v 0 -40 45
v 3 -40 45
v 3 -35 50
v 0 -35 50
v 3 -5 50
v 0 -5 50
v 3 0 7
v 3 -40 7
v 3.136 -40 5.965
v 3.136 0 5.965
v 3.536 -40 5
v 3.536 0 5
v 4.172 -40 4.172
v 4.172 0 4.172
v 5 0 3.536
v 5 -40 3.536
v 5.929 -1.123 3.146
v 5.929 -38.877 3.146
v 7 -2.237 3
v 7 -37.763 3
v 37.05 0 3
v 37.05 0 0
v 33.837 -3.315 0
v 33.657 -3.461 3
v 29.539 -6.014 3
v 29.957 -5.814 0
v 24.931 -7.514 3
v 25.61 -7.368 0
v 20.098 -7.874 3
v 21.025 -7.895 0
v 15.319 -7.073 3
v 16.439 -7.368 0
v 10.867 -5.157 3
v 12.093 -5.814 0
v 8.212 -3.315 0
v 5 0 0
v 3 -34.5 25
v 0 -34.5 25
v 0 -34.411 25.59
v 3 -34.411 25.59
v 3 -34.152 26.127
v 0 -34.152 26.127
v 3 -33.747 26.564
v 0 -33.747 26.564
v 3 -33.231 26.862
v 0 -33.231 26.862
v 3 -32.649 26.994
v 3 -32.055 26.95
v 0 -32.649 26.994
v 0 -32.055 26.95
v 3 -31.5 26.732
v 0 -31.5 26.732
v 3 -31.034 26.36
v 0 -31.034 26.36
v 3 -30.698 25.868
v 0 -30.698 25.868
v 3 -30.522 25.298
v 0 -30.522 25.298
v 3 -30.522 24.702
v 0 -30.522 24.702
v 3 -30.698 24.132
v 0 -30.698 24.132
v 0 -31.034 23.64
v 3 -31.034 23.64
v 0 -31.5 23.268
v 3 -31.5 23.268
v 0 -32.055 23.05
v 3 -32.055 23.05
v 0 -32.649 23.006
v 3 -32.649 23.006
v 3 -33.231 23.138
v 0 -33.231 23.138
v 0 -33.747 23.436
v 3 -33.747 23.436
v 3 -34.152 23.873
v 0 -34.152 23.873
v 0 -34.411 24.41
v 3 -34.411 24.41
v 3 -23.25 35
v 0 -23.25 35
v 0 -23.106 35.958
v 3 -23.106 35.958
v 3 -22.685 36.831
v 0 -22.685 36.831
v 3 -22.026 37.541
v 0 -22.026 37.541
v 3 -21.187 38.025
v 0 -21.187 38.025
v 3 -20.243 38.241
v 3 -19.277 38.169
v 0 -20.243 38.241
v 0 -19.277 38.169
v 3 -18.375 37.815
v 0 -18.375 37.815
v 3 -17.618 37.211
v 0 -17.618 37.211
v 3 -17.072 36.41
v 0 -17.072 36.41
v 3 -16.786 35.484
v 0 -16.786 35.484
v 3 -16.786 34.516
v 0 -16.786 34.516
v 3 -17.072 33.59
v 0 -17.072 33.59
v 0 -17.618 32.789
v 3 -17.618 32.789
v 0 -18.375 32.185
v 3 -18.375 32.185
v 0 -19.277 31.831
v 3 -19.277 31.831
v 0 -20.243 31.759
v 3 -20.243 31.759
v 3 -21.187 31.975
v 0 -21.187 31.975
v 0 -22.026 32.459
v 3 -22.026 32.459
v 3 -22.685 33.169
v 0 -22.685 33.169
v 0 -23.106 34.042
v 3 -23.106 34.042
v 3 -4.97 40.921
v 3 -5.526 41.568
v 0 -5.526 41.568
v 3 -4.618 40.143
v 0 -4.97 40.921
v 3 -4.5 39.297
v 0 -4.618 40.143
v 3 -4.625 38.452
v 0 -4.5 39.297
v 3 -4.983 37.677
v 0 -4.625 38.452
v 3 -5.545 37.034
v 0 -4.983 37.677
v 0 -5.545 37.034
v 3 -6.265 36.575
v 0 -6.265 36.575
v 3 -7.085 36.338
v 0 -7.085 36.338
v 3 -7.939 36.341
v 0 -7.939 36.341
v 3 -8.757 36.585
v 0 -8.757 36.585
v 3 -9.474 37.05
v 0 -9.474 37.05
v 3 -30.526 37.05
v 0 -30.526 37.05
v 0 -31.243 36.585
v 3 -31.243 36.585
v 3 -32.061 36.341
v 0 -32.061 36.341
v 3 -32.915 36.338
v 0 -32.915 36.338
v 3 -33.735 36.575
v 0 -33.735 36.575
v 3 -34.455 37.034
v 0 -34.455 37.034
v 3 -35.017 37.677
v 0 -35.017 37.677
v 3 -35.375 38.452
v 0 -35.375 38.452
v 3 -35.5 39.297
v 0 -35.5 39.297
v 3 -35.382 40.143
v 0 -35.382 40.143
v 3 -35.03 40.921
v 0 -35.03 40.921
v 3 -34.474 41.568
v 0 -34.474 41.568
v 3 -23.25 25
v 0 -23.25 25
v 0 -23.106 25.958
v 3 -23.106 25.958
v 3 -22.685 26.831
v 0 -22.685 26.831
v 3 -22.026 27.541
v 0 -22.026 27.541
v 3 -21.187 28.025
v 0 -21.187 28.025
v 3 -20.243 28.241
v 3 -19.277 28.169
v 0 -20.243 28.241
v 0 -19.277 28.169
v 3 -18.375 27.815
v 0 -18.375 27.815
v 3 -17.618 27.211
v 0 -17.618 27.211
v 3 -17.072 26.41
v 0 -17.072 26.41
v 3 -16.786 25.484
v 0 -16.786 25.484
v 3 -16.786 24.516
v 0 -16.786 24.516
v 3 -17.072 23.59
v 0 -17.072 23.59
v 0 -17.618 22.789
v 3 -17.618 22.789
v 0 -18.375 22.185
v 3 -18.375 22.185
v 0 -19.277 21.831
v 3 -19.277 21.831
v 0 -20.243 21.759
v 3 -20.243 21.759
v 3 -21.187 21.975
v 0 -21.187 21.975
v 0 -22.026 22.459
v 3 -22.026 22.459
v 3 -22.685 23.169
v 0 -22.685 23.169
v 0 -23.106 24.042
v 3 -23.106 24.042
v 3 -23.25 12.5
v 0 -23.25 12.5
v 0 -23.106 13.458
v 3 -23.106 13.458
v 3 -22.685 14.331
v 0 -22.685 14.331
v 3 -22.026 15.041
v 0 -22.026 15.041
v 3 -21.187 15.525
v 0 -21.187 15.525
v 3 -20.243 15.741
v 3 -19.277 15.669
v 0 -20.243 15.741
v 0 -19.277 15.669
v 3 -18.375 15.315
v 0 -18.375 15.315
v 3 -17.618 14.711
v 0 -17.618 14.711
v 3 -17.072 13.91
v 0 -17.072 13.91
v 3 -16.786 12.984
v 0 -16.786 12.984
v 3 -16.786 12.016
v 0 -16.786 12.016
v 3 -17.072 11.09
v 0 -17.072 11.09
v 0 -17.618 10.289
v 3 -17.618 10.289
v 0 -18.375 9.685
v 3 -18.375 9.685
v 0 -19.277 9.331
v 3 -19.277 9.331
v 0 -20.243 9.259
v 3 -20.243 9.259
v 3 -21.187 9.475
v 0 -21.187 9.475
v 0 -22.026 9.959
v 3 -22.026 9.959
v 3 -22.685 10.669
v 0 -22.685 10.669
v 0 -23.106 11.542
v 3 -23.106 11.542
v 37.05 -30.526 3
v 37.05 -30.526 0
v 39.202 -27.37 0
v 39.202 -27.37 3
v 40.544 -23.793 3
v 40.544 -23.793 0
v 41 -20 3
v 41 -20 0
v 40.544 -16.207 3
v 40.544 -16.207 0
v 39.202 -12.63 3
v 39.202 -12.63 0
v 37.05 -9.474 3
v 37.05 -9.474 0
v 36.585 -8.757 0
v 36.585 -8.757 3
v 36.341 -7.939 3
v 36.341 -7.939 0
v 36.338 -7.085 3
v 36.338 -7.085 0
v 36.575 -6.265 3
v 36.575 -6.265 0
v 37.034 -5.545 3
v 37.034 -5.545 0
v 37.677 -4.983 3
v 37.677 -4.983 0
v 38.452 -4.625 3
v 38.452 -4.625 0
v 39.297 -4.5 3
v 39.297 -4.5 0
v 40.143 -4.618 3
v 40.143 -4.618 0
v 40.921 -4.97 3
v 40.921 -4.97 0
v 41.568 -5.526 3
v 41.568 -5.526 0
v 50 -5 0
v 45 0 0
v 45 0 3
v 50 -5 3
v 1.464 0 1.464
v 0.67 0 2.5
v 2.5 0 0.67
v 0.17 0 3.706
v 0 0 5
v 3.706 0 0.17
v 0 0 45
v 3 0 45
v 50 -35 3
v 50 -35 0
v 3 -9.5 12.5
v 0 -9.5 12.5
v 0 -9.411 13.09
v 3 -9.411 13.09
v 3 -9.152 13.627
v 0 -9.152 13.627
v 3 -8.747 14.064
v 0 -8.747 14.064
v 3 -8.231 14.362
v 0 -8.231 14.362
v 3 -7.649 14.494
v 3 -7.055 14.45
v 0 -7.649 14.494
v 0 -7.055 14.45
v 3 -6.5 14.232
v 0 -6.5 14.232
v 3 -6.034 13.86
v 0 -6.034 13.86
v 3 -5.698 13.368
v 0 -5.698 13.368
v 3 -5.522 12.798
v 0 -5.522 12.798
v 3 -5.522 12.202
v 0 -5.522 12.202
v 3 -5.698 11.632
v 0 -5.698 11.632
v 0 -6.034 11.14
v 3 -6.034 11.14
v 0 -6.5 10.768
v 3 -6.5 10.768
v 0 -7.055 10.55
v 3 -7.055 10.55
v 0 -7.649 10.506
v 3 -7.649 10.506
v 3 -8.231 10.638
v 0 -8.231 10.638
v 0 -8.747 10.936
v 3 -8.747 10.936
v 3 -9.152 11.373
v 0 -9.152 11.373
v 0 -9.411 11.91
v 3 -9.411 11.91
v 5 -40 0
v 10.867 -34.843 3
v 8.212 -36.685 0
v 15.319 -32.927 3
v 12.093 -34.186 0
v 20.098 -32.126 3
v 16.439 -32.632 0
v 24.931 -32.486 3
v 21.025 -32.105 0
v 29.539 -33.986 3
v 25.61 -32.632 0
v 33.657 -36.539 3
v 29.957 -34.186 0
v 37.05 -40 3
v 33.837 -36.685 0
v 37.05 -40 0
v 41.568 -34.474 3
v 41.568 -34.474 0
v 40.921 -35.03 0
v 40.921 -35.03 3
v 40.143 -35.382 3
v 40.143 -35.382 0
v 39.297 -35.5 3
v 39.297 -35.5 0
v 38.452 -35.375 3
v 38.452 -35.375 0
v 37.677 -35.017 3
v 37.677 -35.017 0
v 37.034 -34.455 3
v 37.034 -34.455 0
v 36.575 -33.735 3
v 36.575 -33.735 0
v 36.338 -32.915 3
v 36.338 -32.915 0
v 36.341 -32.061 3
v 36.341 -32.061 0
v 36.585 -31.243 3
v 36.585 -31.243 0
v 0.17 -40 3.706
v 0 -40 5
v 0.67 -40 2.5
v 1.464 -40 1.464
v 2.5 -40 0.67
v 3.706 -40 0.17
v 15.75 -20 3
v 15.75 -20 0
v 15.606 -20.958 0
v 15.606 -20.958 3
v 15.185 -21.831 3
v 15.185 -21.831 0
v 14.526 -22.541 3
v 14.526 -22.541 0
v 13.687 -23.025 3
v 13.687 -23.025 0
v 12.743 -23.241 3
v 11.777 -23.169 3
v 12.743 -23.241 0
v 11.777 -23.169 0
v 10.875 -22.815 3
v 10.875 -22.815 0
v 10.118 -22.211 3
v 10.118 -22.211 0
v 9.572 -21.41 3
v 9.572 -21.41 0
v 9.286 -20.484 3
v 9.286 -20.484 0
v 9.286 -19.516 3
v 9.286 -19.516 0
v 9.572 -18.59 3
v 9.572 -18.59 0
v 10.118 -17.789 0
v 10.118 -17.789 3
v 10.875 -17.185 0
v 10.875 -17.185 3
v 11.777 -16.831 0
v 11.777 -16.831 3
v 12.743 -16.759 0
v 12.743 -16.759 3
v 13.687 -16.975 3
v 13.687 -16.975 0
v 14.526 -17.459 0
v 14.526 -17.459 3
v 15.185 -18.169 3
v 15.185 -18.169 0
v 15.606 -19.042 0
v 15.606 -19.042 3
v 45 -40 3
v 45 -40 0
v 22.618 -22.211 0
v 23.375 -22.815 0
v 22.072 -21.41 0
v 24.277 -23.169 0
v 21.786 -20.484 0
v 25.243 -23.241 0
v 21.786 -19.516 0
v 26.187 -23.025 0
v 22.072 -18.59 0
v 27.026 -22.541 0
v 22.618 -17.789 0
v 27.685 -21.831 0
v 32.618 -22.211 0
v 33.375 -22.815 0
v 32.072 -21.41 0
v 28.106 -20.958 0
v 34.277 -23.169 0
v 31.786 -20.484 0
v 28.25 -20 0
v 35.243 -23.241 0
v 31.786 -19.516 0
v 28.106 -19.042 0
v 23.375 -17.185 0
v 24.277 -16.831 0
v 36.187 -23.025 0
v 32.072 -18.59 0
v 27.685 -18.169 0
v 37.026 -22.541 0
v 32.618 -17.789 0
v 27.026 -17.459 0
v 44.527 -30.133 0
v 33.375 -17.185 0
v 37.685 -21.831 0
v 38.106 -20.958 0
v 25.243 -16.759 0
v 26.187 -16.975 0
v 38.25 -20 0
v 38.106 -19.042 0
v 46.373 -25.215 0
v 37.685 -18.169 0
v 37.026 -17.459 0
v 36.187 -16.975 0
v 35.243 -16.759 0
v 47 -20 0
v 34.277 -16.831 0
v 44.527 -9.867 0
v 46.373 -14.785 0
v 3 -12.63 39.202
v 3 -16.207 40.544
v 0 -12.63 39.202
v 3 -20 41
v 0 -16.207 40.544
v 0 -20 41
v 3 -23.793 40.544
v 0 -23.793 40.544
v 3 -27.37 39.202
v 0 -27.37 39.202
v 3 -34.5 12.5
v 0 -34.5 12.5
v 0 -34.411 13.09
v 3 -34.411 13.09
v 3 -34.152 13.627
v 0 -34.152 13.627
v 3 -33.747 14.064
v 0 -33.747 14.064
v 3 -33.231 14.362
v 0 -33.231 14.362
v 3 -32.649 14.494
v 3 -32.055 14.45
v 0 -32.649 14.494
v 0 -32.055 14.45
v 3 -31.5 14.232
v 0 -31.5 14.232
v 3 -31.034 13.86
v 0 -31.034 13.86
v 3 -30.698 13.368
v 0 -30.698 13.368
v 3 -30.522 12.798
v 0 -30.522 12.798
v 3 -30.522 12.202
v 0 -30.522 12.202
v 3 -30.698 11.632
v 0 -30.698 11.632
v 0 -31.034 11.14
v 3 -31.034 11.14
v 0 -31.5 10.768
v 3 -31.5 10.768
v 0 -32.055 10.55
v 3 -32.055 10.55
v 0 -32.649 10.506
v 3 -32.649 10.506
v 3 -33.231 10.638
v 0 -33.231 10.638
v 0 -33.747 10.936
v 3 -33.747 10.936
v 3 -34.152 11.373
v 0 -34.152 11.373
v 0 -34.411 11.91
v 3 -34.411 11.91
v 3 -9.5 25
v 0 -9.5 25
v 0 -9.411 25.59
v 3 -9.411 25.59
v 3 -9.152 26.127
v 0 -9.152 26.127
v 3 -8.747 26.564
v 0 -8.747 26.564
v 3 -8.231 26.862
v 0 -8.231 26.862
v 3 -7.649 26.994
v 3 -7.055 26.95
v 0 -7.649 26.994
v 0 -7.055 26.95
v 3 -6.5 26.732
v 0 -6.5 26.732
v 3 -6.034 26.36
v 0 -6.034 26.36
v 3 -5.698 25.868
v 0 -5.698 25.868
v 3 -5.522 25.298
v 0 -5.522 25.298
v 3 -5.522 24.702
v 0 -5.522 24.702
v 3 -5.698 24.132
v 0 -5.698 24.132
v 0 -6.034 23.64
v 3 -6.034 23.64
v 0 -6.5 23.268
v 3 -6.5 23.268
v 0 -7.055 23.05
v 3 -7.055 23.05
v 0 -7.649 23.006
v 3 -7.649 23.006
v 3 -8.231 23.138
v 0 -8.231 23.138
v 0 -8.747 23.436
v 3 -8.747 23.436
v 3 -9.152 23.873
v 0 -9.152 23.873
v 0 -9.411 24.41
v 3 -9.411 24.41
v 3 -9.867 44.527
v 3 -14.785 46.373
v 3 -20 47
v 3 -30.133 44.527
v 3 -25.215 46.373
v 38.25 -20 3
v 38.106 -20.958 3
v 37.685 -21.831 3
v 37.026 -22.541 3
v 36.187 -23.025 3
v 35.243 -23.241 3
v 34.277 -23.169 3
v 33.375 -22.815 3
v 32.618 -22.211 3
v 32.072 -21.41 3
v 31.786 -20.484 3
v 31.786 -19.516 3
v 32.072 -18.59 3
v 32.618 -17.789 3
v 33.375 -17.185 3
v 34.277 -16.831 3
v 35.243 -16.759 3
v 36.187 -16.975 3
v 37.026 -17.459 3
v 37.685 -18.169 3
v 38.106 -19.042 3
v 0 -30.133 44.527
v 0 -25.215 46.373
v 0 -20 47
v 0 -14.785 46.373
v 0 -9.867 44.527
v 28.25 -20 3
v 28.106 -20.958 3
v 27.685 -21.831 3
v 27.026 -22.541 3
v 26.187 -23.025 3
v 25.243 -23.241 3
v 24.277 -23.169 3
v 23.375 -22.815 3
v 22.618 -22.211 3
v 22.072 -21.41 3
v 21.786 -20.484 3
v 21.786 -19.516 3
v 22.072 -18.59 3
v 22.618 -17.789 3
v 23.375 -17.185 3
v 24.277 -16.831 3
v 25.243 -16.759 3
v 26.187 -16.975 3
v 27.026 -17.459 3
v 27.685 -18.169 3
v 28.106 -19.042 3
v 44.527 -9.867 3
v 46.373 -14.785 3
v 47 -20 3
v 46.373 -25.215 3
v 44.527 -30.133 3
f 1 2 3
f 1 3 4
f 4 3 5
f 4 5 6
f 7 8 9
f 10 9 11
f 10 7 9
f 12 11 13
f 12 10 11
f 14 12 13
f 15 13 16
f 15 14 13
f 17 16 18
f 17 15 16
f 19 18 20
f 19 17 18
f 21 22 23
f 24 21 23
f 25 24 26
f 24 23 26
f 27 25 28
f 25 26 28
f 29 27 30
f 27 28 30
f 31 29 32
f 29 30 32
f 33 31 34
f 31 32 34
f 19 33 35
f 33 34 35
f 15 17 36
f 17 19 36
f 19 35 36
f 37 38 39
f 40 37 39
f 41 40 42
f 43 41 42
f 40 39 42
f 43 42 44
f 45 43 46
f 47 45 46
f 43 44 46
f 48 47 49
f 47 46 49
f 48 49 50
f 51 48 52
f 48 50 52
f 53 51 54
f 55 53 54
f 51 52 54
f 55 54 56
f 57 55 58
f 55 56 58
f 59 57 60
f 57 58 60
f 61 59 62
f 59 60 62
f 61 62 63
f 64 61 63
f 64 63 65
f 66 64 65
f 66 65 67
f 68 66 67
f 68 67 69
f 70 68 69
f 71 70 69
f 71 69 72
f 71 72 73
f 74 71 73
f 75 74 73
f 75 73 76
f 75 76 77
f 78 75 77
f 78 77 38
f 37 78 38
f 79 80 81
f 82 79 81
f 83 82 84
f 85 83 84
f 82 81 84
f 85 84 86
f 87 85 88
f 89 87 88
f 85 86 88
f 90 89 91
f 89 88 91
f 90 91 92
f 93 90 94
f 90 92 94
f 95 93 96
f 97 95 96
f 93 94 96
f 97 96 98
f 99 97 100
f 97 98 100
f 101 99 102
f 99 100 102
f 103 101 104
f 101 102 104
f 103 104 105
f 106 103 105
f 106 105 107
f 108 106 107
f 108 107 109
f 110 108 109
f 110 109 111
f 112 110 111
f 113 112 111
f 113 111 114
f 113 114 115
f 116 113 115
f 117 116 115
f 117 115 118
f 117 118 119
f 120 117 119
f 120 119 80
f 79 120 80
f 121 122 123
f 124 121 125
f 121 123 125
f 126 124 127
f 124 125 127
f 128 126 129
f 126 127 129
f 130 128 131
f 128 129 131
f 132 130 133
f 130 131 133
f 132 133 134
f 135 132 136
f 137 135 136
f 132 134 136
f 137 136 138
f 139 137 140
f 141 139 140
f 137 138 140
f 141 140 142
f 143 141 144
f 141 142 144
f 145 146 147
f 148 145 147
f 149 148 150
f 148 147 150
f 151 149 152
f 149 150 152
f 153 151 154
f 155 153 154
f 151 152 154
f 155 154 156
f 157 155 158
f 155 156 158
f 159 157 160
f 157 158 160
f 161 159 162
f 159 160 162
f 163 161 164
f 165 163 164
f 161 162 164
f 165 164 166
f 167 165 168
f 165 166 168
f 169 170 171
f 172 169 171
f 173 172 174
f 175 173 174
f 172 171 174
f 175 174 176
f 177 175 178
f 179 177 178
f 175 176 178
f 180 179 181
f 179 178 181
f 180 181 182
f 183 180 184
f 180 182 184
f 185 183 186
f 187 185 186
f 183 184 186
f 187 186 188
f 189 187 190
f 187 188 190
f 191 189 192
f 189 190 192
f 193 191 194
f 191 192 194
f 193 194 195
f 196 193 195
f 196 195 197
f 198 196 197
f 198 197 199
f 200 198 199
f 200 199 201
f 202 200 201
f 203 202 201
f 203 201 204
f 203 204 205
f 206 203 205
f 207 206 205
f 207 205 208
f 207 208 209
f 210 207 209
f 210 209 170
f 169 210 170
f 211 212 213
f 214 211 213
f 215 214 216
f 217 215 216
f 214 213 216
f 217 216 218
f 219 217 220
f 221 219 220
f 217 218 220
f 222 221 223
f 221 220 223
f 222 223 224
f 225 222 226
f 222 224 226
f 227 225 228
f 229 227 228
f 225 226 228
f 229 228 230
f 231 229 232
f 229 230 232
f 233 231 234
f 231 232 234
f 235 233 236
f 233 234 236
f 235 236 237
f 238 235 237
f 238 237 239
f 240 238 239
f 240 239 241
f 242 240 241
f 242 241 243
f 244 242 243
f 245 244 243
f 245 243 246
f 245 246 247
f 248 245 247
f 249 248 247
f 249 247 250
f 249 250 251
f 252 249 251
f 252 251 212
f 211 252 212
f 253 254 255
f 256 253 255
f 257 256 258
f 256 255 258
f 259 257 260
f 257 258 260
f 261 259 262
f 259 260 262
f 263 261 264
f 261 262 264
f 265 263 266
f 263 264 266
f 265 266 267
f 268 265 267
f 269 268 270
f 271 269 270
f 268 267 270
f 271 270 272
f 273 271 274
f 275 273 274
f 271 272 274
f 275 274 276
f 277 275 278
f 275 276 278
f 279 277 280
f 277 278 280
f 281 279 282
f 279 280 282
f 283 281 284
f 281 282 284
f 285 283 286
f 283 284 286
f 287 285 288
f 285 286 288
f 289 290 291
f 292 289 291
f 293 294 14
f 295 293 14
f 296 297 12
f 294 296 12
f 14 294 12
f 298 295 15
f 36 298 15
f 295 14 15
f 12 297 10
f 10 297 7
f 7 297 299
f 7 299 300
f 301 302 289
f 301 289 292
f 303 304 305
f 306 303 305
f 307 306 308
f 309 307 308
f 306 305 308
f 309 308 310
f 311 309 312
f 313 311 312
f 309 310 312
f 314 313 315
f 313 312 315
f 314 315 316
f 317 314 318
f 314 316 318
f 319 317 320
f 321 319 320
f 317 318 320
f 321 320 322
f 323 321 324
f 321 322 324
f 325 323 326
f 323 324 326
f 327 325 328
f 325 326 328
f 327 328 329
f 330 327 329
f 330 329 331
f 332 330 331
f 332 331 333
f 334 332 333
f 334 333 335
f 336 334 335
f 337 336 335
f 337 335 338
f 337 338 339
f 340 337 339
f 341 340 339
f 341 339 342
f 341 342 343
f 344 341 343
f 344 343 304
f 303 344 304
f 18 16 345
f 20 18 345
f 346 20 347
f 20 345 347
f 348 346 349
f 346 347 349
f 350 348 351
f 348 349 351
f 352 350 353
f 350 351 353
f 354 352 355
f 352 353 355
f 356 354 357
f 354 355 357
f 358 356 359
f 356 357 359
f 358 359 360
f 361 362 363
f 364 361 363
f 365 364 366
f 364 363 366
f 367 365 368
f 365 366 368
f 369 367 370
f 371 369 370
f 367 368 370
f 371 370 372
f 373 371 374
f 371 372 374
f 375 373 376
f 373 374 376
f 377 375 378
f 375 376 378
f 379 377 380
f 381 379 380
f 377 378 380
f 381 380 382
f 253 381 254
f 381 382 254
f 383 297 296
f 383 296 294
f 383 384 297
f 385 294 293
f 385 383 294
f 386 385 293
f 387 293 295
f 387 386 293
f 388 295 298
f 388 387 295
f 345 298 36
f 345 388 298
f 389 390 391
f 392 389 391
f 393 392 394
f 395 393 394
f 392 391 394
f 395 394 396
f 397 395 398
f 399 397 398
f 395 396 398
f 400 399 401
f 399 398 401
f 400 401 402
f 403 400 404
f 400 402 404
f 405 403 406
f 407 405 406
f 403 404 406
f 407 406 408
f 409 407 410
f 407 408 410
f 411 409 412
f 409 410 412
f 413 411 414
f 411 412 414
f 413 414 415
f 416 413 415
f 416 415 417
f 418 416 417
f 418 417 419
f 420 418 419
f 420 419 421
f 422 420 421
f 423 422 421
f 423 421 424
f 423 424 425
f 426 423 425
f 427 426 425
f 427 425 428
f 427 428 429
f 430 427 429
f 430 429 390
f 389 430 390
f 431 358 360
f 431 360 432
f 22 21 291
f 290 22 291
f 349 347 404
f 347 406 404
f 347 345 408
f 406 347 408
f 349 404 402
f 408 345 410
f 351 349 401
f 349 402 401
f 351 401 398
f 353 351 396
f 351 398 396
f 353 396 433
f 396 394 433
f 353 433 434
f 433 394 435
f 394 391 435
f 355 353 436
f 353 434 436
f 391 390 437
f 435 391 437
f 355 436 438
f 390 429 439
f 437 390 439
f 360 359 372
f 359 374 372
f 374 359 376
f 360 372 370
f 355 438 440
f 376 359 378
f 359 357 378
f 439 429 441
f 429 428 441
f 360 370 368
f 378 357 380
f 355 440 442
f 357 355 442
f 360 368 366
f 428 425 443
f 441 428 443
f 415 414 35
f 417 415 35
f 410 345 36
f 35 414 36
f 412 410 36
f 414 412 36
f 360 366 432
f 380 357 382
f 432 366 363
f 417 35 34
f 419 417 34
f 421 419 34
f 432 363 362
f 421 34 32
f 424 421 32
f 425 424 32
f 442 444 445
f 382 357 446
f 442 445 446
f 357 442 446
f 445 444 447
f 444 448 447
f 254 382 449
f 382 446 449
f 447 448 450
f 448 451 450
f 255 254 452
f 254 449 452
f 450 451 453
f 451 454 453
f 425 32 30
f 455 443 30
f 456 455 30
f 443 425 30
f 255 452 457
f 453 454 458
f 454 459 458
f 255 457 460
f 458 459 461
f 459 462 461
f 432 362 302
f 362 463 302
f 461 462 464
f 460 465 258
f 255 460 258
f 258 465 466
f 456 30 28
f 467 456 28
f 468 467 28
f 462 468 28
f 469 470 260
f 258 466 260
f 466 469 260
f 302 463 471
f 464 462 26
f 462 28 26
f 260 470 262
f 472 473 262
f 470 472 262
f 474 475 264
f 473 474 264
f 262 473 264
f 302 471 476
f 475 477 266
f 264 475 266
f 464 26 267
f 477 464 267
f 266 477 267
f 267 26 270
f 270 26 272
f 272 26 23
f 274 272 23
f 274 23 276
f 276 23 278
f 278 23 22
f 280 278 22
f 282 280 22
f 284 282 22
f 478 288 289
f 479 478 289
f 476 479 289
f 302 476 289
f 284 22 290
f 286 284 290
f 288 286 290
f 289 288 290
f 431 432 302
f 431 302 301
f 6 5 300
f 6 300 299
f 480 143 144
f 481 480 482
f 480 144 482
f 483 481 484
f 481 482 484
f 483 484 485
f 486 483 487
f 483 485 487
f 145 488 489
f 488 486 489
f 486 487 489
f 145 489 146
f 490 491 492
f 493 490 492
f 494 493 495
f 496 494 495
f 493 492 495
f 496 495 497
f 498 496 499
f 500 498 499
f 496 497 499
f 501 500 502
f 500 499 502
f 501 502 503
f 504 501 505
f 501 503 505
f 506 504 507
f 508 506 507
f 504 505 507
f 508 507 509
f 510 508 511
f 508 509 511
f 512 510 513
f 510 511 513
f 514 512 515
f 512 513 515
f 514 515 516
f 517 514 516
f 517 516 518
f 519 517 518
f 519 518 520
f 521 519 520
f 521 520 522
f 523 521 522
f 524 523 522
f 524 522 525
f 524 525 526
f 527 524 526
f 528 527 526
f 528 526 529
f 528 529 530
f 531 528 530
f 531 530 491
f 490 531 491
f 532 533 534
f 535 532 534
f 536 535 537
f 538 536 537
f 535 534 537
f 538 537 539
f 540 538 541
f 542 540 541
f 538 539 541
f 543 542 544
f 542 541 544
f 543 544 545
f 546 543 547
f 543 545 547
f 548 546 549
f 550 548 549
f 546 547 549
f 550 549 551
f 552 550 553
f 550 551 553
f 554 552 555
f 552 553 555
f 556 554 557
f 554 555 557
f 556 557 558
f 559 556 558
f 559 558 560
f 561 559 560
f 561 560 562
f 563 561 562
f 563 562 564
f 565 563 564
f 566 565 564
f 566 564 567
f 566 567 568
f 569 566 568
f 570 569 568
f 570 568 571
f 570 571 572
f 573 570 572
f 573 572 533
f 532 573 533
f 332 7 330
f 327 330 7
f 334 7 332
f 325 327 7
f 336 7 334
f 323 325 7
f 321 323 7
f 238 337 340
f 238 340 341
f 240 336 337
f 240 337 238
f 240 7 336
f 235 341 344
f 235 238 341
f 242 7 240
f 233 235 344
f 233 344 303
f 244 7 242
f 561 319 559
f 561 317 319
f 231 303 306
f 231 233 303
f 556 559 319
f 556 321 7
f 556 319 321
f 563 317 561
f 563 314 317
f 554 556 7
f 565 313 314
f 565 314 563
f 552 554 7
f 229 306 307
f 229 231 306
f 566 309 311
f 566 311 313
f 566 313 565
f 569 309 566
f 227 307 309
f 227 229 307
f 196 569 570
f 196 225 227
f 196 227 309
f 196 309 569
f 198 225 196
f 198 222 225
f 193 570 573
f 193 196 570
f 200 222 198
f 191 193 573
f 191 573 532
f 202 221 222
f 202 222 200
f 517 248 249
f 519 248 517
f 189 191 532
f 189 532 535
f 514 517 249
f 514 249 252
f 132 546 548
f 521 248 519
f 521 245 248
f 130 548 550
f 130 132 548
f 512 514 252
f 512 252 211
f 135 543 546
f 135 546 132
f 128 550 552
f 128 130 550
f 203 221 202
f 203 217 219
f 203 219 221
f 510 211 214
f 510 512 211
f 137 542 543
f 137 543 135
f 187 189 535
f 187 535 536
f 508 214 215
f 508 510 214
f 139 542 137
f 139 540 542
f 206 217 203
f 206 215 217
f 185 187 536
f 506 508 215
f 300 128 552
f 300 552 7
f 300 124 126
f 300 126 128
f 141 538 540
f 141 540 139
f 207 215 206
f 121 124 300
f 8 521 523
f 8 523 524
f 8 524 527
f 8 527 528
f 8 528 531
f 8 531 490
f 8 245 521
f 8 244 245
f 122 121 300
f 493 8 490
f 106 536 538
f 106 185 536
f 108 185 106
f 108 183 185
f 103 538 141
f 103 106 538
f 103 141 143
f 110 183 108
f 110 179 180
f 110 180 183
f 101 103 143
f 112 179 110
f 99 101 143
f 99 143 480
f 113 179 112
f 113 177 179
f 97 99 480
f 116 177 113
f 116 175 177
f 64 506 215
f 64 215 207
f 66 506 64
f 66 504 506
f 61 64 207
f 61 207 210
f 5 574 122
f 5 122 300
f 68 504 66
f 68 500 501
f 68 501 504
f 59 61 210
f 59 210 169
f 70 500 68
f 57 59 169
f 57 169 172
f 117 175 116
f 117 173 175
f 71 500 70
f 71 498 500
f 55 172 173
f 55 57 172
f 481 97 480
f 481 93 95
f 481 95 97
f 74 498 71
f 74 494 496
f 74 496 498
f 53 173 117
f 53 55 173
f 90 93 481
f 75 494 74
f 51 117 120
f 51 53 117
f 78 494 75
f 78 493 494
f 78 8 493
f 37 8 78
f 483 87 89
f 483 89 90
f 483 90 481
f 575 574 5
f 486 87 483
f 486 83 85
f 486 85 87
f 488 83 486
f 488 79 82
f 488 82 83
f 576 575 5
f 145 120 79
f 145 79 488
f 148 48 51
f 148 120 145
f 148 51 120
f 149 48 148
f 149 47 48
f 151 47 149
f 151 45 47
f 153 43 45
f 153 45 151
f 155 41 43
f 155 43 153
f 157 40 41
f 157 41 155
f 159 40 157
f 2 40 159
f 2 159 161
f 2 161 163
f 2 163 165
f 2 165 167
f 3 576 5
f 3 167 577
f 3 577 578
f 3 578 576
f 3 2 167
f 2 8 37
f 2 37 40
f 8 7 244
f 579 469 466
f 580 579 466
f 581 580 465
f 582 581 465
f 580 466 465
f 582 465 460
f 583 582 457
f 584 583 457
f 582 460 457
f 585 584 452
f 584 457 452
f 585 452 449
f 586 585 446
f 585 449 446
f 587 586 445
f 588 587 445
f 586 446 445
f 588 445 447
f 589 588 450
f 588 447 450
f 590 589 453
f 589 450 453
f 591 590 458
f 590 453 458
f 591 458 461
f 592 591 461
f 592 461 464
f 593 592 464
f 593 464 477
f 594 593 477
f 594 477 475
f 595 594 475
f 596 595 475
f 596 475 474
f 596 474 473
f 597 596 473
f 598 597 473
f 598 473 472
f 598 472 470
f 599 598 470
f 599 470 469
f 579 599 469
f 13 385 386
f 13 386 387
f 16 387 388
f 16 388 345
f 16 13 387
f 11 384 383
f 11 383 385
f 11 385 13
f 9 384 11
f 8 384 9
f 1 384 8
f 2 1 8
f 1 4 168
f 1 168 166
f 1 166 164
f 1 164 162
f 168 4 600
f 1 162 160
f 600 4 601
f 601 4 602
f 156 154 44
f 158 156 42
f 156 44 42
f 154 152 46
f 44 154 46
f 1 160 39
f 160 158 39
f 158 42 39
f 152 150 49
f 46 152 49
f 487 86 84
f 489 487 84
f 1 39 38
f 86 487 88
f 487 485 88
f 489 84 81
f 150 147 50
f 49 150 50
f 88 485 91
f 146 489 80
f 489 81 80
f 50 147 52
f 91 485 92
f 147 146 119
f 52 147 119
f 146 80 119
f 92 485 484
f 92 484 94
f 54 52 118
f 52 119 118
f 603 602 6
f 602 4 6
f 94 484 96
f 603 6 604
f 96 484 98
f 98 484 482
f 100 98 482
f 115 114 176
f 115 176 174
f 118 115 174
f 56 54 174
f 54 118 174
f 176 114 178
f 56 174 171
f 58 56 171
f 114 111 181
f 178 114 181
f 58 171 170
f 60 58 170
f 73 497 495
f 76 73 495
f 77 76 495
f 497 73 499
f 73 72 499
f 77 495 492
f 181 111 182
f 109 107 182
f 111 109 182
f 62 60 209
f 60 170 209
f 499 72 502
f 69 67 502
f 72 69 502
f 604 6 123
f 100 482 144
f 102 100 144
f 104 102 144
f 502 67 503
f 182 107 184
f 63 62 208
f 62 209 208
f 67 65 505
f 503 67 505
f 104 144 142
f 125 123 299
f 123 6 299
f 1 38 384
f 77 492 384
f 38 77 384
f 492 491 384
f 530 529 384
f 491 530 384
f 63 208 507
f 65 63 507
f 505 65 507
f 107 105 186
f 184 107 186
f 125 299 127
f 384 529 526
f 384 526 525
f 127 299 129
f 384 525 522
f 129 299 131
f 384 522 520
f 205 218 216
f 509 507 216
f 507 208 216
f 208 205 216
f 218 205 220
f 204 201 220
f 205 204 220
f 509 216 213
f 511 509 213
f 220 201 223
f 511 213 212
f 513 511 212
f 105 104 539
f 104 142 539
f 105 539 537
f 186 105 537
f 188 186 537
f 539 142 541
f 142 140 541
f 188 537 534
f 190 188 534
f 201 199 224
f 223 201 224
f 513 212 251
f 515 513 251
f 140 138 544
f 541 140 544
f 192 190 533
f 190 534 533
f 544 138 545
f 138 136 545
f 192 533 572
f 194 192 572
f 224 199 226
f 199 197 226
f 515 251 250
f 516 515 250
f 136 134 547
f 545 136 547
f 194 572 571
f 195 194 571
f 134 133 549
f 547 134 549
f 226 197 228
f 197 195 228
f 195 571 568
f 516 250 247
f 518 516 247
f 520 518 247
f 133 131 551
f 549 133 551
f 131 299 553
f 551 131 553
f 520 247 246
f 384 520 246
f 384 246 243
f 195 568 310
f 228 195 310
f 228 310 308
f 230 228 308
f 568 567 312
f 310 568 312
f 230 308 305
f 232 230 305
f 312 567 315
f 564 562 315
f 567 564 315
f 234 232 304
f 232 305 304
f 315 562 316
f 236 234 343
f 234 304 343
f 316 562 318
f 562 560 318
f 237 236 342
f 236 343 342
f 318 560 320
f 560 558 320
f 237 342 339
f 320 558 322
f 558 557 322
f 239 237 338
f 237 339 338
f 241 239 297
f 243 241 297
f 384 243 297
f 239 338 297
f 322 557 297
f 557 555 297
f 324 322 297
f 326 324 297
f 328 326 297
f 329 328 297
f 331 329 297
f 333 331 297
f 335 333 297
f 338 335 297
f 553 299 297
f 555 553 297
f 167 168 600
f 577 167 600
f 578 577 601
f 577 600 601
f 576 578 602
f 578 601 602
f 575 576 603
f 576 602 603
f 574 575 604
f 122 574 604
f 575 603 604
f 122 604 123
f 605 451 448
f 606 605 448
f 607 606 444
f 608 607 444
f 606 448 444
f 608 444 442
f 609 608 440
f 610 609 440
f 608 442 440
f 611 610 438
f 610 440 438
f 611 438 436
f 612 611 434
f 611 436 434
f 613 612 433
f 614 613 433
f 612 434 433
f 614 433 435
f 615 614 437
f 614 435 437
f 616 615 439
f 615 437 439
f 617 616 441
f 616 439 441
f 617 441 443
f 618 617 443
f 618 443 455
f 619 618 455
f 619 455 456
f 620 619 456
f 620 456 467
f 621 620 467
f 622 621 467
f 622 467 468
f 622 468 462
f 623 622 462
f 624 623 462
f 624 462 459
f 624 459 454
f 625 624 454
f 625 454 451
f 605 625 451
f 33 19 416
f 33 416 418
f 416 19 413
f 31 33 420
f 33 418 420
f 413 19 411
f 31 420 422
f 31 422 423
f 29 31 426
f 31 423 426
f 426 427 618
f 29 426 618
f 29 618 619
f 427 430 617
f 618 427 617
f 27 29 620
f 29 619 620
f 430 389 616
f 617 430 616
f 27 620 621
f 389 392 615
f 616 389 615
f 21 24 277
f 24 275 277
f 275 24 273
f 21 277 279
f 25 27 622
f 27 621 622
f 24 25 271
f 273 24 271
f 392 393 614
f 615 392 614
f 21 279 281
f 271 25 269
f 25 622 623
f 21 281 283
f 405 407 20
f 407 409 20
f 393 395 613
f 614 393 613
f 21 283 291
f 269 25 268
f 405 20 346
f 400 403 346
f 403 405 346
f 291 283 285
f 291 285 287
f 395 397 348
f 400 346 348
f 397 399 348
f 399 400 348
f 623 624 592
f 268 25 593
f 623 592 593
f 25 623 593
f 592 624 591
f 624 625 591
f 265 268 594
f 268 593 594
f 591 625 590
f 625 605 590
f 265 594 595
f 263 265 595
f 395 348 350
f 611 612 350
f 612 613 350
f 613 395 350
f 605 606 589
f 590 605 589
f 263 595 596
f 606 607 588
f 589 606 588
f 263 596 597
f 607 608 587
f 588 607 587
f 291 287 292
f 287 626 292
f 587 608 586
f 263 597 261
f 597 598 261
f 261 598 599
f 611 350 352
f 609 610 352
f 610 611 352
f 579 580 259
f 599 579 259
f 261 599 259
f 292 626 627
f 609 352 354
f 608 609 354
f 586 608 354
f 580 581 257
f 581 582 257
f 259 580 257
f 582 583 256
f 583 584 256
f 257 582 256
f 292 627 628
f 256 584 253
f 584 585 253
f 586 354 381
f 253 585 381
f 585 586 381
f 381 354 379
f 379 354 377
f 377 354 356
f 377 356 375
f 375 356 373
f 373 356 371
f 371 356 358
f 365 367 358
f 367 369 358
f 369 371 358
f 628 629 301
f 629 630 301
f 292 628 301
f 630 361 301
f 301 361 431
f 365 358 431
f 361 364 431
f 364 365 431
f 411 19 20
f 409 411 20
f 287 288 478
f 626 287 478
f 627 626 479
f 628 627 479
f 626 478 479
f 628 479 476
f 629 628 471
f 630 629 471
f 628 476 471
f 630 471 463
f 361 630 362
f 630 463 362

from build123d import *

# Parameters (mm, degrees)
F1_DEPTH  = 40
F2_R      = 3.25
F3_DEPTH  = 25
F4_R      = 3.25
F4_R_2    = 2
F5_DEPTH  = 25
F6_SIZE   = 5
F7_SIZE   = 5
F8_DEPTH  = 25
F9_W      = 50.789644
F9_H      = 57.590966
F10_DEPTH = 51.1
F11_SIZE  = 5
F12_SIZE  = 5
F13_R     = 4
F14_R     = 5


with BuildPart() as f1:
    # F0 (on Front) → F1 (new body)
    with BuildSketch(Plane.XZ):
        Polygon((0, 50), (0, 0), (50, 0), (50, 5), (5, 5), (5, 50), align=None)
    extrude(amount=F1_DEPTH)

    # F2 (on face) → F3 (cut)
    with BuildSketch(Plane(origin=(0, 0, 0), x_dir=(1, 0, 0), z_dir=(0, 0, -1))):
        with Locations((25, 20)):
            Circle(F2_R)
        with BuildLine():
            ThreePointArc((37.049758, 30.526316), (41, 20), (37.049758, 9.473684))
            ThreePointArc((37.049758, 9.473684), (37.335405, 5.240671), (41.568419, 5.526317))
            ThreePointArc((41.568419, 5.526317), (47, 20.000001), (41.568418, 34.473684))
            ThreePointArc((41.568418, 34.473684), (37.335404, 34.75933), (37.049758, 30.526316))
        make_face()
        with Locations((12.5, 20)):
            Circle(F2_R)
        with Locations((35, 20)):
            Circle(F2_R)
        with BuildLine():
            Line((26.554622, -9.521332), (37.049758, 0))
            ThreePointArc((37.049758, 0), (21.024879, 7.89477), (5, 0))
            Line((5, 0), (26.554622, -9.521332))
        make_face()
        with BuildLine():
            Line((21.024879, 52.316344), (5, 40))
            ThreePointArc((5, 40), (21.024879, 32.105231), (37.049758, 40))
            Line((37.049758, 40), (21.024879, 52.316344))
        make_face()
    extrude(amount=-F3_DEPTH, mode=Mode.SUBTRACT)

    # F4 (on face) → F5 (cut)
    with BuildSketch(Plane(origin=(0, 0, 0), x_dir=(0, -1, 0), z_dir=(-1, 0, 0))):
        with Locations((20, 12.5)):
            Circle(F4_R)
        with Locations((20, 25)):
            Circle(F4_R)
        with Locations((20, 35)):
            Circle(F4_R)
        with BuildLine():
            ThreePointArc((9.473684, 37.049758), (20, 41), (30.526316, 37.049758))
            ThreePointArc((30.526316, 37.049758), (34.75933, 37.335404), (34.473684, 41.568418))
            ThreePointArc((34.473684, 41.568418), (20, 47), (5.526316, 41.568418))
            ThreePointArc((5.526316, 41.568418), (5.24067, 37.335404), (9.473684, 37.049758))
        make_face()
        with Locations((32.5, 12.5)):
            Circle(F4_R_2)
        with Locations((32.5, 25)):
            Circle(F4_R_2)
        with Locations((7.5, 25)):
            Circle(F4_R_2)
        with Locations((7.5, 12.5)):
            Circle(F4_R_2)
    extrude(amount=-F5_DEPTH, mode=Mode.SUBTRACT)

    # F6
    f6_edges = [f1.edges().sort_by_distance(p)[0] for p in [
        (50, -40, 2.5),
    ]]
    chamfer(f6_edges, length=F6_SIZE)

    # F7
    f7_edges = [f1.edges().sort_by_distance(p)[0] for p in [
        (50, 0, 2.5),
    ]]
    chamfer(f7_edges, length=F7_SIZE)

    # F2 (on face) → F8 (cut)
    with BuildSketch(Plane(origin=(0, 0, 0), x_dir=(1, 0, 0), z_dir=(0, 0, -1))):
        with Locations((25, 20)):
            Circle(F2_R)
        with BuildLine():
            ThreePointArc((37.049758, 30.526316), (41, 20), (37.049758, 9.473684))
            ThreePointArc((37.049758, 9.473684), (37.335405, 5.240671), (41.568419, 5.526317))
            ThreePointArc((41.568419, 5.526317), (47, 20.000001), (41.568418, 34.473684))
            ThreePointArc((41.568418, 34.473684), (37.335404, 34.75933), (37.049758, 30.526316))
        make_face()
        with Locations((12.5, 20)):
            Circle(F2_R)
        with Locations((35, 20)):
            Circle(F2_R)
        with BuildLine():
            Line((26.554622, -9.521332), (37.049758, 0))
            ThreePointArc((37.049758, 0), (21.024879, 7.89477), (5, 0))
            Line((5, 0), (26.554622, -9.521332))
        make_face()
        with BuildLine():
            Line((21.024879, 52.316344), (5, 40))
            ThreePointArc((5, 40), (21.024879, 32.105231), (37.049758, 40))
            Line((37.049758, 40), (21.024879, 52.316344))
        make_face()
    extrude(amount=F8_DEPTH, mode=Mode.SUBTRACT)

    # F9 (on face) → F10 (cut)
    with BuildSketch(Plane.XZ.offset(40)):
        with Locations((28.394822, 31.795483)):
            Rectangle(F9_W, F9_H)
    extrude(amount=-F10_DEPTH, mode=Mode.SUBTRACT)

    # F11
    f11_edges = [f1.edges().sort_by_distance(p)[0] for p in [
        (1.5, 0, 50),
    ]]
    chamfer(f11_edges, length=F11_SIZE)

    # F12
    f12_edges = [f1.edges().sort_by_distance(p)[0] for p in [
        (1.5, -40, 50),
    ]]
    chamfer(f12_edges, length=F12_SIZE)

    # F13
    f13_edges = [f1.edges().sort_by_distance(p)[0] for p in [
        (3, -20, 3),
    ]]
    fillet(f13_edges, radius=F13_R)

    # F14
    f14_edges = [f1.edges().sort_by_distance(p)[0] for p in [
        (0, -20, 0),
    ]]
    fillet(f14_edges, radius=F14_R)


solid = f1.part
